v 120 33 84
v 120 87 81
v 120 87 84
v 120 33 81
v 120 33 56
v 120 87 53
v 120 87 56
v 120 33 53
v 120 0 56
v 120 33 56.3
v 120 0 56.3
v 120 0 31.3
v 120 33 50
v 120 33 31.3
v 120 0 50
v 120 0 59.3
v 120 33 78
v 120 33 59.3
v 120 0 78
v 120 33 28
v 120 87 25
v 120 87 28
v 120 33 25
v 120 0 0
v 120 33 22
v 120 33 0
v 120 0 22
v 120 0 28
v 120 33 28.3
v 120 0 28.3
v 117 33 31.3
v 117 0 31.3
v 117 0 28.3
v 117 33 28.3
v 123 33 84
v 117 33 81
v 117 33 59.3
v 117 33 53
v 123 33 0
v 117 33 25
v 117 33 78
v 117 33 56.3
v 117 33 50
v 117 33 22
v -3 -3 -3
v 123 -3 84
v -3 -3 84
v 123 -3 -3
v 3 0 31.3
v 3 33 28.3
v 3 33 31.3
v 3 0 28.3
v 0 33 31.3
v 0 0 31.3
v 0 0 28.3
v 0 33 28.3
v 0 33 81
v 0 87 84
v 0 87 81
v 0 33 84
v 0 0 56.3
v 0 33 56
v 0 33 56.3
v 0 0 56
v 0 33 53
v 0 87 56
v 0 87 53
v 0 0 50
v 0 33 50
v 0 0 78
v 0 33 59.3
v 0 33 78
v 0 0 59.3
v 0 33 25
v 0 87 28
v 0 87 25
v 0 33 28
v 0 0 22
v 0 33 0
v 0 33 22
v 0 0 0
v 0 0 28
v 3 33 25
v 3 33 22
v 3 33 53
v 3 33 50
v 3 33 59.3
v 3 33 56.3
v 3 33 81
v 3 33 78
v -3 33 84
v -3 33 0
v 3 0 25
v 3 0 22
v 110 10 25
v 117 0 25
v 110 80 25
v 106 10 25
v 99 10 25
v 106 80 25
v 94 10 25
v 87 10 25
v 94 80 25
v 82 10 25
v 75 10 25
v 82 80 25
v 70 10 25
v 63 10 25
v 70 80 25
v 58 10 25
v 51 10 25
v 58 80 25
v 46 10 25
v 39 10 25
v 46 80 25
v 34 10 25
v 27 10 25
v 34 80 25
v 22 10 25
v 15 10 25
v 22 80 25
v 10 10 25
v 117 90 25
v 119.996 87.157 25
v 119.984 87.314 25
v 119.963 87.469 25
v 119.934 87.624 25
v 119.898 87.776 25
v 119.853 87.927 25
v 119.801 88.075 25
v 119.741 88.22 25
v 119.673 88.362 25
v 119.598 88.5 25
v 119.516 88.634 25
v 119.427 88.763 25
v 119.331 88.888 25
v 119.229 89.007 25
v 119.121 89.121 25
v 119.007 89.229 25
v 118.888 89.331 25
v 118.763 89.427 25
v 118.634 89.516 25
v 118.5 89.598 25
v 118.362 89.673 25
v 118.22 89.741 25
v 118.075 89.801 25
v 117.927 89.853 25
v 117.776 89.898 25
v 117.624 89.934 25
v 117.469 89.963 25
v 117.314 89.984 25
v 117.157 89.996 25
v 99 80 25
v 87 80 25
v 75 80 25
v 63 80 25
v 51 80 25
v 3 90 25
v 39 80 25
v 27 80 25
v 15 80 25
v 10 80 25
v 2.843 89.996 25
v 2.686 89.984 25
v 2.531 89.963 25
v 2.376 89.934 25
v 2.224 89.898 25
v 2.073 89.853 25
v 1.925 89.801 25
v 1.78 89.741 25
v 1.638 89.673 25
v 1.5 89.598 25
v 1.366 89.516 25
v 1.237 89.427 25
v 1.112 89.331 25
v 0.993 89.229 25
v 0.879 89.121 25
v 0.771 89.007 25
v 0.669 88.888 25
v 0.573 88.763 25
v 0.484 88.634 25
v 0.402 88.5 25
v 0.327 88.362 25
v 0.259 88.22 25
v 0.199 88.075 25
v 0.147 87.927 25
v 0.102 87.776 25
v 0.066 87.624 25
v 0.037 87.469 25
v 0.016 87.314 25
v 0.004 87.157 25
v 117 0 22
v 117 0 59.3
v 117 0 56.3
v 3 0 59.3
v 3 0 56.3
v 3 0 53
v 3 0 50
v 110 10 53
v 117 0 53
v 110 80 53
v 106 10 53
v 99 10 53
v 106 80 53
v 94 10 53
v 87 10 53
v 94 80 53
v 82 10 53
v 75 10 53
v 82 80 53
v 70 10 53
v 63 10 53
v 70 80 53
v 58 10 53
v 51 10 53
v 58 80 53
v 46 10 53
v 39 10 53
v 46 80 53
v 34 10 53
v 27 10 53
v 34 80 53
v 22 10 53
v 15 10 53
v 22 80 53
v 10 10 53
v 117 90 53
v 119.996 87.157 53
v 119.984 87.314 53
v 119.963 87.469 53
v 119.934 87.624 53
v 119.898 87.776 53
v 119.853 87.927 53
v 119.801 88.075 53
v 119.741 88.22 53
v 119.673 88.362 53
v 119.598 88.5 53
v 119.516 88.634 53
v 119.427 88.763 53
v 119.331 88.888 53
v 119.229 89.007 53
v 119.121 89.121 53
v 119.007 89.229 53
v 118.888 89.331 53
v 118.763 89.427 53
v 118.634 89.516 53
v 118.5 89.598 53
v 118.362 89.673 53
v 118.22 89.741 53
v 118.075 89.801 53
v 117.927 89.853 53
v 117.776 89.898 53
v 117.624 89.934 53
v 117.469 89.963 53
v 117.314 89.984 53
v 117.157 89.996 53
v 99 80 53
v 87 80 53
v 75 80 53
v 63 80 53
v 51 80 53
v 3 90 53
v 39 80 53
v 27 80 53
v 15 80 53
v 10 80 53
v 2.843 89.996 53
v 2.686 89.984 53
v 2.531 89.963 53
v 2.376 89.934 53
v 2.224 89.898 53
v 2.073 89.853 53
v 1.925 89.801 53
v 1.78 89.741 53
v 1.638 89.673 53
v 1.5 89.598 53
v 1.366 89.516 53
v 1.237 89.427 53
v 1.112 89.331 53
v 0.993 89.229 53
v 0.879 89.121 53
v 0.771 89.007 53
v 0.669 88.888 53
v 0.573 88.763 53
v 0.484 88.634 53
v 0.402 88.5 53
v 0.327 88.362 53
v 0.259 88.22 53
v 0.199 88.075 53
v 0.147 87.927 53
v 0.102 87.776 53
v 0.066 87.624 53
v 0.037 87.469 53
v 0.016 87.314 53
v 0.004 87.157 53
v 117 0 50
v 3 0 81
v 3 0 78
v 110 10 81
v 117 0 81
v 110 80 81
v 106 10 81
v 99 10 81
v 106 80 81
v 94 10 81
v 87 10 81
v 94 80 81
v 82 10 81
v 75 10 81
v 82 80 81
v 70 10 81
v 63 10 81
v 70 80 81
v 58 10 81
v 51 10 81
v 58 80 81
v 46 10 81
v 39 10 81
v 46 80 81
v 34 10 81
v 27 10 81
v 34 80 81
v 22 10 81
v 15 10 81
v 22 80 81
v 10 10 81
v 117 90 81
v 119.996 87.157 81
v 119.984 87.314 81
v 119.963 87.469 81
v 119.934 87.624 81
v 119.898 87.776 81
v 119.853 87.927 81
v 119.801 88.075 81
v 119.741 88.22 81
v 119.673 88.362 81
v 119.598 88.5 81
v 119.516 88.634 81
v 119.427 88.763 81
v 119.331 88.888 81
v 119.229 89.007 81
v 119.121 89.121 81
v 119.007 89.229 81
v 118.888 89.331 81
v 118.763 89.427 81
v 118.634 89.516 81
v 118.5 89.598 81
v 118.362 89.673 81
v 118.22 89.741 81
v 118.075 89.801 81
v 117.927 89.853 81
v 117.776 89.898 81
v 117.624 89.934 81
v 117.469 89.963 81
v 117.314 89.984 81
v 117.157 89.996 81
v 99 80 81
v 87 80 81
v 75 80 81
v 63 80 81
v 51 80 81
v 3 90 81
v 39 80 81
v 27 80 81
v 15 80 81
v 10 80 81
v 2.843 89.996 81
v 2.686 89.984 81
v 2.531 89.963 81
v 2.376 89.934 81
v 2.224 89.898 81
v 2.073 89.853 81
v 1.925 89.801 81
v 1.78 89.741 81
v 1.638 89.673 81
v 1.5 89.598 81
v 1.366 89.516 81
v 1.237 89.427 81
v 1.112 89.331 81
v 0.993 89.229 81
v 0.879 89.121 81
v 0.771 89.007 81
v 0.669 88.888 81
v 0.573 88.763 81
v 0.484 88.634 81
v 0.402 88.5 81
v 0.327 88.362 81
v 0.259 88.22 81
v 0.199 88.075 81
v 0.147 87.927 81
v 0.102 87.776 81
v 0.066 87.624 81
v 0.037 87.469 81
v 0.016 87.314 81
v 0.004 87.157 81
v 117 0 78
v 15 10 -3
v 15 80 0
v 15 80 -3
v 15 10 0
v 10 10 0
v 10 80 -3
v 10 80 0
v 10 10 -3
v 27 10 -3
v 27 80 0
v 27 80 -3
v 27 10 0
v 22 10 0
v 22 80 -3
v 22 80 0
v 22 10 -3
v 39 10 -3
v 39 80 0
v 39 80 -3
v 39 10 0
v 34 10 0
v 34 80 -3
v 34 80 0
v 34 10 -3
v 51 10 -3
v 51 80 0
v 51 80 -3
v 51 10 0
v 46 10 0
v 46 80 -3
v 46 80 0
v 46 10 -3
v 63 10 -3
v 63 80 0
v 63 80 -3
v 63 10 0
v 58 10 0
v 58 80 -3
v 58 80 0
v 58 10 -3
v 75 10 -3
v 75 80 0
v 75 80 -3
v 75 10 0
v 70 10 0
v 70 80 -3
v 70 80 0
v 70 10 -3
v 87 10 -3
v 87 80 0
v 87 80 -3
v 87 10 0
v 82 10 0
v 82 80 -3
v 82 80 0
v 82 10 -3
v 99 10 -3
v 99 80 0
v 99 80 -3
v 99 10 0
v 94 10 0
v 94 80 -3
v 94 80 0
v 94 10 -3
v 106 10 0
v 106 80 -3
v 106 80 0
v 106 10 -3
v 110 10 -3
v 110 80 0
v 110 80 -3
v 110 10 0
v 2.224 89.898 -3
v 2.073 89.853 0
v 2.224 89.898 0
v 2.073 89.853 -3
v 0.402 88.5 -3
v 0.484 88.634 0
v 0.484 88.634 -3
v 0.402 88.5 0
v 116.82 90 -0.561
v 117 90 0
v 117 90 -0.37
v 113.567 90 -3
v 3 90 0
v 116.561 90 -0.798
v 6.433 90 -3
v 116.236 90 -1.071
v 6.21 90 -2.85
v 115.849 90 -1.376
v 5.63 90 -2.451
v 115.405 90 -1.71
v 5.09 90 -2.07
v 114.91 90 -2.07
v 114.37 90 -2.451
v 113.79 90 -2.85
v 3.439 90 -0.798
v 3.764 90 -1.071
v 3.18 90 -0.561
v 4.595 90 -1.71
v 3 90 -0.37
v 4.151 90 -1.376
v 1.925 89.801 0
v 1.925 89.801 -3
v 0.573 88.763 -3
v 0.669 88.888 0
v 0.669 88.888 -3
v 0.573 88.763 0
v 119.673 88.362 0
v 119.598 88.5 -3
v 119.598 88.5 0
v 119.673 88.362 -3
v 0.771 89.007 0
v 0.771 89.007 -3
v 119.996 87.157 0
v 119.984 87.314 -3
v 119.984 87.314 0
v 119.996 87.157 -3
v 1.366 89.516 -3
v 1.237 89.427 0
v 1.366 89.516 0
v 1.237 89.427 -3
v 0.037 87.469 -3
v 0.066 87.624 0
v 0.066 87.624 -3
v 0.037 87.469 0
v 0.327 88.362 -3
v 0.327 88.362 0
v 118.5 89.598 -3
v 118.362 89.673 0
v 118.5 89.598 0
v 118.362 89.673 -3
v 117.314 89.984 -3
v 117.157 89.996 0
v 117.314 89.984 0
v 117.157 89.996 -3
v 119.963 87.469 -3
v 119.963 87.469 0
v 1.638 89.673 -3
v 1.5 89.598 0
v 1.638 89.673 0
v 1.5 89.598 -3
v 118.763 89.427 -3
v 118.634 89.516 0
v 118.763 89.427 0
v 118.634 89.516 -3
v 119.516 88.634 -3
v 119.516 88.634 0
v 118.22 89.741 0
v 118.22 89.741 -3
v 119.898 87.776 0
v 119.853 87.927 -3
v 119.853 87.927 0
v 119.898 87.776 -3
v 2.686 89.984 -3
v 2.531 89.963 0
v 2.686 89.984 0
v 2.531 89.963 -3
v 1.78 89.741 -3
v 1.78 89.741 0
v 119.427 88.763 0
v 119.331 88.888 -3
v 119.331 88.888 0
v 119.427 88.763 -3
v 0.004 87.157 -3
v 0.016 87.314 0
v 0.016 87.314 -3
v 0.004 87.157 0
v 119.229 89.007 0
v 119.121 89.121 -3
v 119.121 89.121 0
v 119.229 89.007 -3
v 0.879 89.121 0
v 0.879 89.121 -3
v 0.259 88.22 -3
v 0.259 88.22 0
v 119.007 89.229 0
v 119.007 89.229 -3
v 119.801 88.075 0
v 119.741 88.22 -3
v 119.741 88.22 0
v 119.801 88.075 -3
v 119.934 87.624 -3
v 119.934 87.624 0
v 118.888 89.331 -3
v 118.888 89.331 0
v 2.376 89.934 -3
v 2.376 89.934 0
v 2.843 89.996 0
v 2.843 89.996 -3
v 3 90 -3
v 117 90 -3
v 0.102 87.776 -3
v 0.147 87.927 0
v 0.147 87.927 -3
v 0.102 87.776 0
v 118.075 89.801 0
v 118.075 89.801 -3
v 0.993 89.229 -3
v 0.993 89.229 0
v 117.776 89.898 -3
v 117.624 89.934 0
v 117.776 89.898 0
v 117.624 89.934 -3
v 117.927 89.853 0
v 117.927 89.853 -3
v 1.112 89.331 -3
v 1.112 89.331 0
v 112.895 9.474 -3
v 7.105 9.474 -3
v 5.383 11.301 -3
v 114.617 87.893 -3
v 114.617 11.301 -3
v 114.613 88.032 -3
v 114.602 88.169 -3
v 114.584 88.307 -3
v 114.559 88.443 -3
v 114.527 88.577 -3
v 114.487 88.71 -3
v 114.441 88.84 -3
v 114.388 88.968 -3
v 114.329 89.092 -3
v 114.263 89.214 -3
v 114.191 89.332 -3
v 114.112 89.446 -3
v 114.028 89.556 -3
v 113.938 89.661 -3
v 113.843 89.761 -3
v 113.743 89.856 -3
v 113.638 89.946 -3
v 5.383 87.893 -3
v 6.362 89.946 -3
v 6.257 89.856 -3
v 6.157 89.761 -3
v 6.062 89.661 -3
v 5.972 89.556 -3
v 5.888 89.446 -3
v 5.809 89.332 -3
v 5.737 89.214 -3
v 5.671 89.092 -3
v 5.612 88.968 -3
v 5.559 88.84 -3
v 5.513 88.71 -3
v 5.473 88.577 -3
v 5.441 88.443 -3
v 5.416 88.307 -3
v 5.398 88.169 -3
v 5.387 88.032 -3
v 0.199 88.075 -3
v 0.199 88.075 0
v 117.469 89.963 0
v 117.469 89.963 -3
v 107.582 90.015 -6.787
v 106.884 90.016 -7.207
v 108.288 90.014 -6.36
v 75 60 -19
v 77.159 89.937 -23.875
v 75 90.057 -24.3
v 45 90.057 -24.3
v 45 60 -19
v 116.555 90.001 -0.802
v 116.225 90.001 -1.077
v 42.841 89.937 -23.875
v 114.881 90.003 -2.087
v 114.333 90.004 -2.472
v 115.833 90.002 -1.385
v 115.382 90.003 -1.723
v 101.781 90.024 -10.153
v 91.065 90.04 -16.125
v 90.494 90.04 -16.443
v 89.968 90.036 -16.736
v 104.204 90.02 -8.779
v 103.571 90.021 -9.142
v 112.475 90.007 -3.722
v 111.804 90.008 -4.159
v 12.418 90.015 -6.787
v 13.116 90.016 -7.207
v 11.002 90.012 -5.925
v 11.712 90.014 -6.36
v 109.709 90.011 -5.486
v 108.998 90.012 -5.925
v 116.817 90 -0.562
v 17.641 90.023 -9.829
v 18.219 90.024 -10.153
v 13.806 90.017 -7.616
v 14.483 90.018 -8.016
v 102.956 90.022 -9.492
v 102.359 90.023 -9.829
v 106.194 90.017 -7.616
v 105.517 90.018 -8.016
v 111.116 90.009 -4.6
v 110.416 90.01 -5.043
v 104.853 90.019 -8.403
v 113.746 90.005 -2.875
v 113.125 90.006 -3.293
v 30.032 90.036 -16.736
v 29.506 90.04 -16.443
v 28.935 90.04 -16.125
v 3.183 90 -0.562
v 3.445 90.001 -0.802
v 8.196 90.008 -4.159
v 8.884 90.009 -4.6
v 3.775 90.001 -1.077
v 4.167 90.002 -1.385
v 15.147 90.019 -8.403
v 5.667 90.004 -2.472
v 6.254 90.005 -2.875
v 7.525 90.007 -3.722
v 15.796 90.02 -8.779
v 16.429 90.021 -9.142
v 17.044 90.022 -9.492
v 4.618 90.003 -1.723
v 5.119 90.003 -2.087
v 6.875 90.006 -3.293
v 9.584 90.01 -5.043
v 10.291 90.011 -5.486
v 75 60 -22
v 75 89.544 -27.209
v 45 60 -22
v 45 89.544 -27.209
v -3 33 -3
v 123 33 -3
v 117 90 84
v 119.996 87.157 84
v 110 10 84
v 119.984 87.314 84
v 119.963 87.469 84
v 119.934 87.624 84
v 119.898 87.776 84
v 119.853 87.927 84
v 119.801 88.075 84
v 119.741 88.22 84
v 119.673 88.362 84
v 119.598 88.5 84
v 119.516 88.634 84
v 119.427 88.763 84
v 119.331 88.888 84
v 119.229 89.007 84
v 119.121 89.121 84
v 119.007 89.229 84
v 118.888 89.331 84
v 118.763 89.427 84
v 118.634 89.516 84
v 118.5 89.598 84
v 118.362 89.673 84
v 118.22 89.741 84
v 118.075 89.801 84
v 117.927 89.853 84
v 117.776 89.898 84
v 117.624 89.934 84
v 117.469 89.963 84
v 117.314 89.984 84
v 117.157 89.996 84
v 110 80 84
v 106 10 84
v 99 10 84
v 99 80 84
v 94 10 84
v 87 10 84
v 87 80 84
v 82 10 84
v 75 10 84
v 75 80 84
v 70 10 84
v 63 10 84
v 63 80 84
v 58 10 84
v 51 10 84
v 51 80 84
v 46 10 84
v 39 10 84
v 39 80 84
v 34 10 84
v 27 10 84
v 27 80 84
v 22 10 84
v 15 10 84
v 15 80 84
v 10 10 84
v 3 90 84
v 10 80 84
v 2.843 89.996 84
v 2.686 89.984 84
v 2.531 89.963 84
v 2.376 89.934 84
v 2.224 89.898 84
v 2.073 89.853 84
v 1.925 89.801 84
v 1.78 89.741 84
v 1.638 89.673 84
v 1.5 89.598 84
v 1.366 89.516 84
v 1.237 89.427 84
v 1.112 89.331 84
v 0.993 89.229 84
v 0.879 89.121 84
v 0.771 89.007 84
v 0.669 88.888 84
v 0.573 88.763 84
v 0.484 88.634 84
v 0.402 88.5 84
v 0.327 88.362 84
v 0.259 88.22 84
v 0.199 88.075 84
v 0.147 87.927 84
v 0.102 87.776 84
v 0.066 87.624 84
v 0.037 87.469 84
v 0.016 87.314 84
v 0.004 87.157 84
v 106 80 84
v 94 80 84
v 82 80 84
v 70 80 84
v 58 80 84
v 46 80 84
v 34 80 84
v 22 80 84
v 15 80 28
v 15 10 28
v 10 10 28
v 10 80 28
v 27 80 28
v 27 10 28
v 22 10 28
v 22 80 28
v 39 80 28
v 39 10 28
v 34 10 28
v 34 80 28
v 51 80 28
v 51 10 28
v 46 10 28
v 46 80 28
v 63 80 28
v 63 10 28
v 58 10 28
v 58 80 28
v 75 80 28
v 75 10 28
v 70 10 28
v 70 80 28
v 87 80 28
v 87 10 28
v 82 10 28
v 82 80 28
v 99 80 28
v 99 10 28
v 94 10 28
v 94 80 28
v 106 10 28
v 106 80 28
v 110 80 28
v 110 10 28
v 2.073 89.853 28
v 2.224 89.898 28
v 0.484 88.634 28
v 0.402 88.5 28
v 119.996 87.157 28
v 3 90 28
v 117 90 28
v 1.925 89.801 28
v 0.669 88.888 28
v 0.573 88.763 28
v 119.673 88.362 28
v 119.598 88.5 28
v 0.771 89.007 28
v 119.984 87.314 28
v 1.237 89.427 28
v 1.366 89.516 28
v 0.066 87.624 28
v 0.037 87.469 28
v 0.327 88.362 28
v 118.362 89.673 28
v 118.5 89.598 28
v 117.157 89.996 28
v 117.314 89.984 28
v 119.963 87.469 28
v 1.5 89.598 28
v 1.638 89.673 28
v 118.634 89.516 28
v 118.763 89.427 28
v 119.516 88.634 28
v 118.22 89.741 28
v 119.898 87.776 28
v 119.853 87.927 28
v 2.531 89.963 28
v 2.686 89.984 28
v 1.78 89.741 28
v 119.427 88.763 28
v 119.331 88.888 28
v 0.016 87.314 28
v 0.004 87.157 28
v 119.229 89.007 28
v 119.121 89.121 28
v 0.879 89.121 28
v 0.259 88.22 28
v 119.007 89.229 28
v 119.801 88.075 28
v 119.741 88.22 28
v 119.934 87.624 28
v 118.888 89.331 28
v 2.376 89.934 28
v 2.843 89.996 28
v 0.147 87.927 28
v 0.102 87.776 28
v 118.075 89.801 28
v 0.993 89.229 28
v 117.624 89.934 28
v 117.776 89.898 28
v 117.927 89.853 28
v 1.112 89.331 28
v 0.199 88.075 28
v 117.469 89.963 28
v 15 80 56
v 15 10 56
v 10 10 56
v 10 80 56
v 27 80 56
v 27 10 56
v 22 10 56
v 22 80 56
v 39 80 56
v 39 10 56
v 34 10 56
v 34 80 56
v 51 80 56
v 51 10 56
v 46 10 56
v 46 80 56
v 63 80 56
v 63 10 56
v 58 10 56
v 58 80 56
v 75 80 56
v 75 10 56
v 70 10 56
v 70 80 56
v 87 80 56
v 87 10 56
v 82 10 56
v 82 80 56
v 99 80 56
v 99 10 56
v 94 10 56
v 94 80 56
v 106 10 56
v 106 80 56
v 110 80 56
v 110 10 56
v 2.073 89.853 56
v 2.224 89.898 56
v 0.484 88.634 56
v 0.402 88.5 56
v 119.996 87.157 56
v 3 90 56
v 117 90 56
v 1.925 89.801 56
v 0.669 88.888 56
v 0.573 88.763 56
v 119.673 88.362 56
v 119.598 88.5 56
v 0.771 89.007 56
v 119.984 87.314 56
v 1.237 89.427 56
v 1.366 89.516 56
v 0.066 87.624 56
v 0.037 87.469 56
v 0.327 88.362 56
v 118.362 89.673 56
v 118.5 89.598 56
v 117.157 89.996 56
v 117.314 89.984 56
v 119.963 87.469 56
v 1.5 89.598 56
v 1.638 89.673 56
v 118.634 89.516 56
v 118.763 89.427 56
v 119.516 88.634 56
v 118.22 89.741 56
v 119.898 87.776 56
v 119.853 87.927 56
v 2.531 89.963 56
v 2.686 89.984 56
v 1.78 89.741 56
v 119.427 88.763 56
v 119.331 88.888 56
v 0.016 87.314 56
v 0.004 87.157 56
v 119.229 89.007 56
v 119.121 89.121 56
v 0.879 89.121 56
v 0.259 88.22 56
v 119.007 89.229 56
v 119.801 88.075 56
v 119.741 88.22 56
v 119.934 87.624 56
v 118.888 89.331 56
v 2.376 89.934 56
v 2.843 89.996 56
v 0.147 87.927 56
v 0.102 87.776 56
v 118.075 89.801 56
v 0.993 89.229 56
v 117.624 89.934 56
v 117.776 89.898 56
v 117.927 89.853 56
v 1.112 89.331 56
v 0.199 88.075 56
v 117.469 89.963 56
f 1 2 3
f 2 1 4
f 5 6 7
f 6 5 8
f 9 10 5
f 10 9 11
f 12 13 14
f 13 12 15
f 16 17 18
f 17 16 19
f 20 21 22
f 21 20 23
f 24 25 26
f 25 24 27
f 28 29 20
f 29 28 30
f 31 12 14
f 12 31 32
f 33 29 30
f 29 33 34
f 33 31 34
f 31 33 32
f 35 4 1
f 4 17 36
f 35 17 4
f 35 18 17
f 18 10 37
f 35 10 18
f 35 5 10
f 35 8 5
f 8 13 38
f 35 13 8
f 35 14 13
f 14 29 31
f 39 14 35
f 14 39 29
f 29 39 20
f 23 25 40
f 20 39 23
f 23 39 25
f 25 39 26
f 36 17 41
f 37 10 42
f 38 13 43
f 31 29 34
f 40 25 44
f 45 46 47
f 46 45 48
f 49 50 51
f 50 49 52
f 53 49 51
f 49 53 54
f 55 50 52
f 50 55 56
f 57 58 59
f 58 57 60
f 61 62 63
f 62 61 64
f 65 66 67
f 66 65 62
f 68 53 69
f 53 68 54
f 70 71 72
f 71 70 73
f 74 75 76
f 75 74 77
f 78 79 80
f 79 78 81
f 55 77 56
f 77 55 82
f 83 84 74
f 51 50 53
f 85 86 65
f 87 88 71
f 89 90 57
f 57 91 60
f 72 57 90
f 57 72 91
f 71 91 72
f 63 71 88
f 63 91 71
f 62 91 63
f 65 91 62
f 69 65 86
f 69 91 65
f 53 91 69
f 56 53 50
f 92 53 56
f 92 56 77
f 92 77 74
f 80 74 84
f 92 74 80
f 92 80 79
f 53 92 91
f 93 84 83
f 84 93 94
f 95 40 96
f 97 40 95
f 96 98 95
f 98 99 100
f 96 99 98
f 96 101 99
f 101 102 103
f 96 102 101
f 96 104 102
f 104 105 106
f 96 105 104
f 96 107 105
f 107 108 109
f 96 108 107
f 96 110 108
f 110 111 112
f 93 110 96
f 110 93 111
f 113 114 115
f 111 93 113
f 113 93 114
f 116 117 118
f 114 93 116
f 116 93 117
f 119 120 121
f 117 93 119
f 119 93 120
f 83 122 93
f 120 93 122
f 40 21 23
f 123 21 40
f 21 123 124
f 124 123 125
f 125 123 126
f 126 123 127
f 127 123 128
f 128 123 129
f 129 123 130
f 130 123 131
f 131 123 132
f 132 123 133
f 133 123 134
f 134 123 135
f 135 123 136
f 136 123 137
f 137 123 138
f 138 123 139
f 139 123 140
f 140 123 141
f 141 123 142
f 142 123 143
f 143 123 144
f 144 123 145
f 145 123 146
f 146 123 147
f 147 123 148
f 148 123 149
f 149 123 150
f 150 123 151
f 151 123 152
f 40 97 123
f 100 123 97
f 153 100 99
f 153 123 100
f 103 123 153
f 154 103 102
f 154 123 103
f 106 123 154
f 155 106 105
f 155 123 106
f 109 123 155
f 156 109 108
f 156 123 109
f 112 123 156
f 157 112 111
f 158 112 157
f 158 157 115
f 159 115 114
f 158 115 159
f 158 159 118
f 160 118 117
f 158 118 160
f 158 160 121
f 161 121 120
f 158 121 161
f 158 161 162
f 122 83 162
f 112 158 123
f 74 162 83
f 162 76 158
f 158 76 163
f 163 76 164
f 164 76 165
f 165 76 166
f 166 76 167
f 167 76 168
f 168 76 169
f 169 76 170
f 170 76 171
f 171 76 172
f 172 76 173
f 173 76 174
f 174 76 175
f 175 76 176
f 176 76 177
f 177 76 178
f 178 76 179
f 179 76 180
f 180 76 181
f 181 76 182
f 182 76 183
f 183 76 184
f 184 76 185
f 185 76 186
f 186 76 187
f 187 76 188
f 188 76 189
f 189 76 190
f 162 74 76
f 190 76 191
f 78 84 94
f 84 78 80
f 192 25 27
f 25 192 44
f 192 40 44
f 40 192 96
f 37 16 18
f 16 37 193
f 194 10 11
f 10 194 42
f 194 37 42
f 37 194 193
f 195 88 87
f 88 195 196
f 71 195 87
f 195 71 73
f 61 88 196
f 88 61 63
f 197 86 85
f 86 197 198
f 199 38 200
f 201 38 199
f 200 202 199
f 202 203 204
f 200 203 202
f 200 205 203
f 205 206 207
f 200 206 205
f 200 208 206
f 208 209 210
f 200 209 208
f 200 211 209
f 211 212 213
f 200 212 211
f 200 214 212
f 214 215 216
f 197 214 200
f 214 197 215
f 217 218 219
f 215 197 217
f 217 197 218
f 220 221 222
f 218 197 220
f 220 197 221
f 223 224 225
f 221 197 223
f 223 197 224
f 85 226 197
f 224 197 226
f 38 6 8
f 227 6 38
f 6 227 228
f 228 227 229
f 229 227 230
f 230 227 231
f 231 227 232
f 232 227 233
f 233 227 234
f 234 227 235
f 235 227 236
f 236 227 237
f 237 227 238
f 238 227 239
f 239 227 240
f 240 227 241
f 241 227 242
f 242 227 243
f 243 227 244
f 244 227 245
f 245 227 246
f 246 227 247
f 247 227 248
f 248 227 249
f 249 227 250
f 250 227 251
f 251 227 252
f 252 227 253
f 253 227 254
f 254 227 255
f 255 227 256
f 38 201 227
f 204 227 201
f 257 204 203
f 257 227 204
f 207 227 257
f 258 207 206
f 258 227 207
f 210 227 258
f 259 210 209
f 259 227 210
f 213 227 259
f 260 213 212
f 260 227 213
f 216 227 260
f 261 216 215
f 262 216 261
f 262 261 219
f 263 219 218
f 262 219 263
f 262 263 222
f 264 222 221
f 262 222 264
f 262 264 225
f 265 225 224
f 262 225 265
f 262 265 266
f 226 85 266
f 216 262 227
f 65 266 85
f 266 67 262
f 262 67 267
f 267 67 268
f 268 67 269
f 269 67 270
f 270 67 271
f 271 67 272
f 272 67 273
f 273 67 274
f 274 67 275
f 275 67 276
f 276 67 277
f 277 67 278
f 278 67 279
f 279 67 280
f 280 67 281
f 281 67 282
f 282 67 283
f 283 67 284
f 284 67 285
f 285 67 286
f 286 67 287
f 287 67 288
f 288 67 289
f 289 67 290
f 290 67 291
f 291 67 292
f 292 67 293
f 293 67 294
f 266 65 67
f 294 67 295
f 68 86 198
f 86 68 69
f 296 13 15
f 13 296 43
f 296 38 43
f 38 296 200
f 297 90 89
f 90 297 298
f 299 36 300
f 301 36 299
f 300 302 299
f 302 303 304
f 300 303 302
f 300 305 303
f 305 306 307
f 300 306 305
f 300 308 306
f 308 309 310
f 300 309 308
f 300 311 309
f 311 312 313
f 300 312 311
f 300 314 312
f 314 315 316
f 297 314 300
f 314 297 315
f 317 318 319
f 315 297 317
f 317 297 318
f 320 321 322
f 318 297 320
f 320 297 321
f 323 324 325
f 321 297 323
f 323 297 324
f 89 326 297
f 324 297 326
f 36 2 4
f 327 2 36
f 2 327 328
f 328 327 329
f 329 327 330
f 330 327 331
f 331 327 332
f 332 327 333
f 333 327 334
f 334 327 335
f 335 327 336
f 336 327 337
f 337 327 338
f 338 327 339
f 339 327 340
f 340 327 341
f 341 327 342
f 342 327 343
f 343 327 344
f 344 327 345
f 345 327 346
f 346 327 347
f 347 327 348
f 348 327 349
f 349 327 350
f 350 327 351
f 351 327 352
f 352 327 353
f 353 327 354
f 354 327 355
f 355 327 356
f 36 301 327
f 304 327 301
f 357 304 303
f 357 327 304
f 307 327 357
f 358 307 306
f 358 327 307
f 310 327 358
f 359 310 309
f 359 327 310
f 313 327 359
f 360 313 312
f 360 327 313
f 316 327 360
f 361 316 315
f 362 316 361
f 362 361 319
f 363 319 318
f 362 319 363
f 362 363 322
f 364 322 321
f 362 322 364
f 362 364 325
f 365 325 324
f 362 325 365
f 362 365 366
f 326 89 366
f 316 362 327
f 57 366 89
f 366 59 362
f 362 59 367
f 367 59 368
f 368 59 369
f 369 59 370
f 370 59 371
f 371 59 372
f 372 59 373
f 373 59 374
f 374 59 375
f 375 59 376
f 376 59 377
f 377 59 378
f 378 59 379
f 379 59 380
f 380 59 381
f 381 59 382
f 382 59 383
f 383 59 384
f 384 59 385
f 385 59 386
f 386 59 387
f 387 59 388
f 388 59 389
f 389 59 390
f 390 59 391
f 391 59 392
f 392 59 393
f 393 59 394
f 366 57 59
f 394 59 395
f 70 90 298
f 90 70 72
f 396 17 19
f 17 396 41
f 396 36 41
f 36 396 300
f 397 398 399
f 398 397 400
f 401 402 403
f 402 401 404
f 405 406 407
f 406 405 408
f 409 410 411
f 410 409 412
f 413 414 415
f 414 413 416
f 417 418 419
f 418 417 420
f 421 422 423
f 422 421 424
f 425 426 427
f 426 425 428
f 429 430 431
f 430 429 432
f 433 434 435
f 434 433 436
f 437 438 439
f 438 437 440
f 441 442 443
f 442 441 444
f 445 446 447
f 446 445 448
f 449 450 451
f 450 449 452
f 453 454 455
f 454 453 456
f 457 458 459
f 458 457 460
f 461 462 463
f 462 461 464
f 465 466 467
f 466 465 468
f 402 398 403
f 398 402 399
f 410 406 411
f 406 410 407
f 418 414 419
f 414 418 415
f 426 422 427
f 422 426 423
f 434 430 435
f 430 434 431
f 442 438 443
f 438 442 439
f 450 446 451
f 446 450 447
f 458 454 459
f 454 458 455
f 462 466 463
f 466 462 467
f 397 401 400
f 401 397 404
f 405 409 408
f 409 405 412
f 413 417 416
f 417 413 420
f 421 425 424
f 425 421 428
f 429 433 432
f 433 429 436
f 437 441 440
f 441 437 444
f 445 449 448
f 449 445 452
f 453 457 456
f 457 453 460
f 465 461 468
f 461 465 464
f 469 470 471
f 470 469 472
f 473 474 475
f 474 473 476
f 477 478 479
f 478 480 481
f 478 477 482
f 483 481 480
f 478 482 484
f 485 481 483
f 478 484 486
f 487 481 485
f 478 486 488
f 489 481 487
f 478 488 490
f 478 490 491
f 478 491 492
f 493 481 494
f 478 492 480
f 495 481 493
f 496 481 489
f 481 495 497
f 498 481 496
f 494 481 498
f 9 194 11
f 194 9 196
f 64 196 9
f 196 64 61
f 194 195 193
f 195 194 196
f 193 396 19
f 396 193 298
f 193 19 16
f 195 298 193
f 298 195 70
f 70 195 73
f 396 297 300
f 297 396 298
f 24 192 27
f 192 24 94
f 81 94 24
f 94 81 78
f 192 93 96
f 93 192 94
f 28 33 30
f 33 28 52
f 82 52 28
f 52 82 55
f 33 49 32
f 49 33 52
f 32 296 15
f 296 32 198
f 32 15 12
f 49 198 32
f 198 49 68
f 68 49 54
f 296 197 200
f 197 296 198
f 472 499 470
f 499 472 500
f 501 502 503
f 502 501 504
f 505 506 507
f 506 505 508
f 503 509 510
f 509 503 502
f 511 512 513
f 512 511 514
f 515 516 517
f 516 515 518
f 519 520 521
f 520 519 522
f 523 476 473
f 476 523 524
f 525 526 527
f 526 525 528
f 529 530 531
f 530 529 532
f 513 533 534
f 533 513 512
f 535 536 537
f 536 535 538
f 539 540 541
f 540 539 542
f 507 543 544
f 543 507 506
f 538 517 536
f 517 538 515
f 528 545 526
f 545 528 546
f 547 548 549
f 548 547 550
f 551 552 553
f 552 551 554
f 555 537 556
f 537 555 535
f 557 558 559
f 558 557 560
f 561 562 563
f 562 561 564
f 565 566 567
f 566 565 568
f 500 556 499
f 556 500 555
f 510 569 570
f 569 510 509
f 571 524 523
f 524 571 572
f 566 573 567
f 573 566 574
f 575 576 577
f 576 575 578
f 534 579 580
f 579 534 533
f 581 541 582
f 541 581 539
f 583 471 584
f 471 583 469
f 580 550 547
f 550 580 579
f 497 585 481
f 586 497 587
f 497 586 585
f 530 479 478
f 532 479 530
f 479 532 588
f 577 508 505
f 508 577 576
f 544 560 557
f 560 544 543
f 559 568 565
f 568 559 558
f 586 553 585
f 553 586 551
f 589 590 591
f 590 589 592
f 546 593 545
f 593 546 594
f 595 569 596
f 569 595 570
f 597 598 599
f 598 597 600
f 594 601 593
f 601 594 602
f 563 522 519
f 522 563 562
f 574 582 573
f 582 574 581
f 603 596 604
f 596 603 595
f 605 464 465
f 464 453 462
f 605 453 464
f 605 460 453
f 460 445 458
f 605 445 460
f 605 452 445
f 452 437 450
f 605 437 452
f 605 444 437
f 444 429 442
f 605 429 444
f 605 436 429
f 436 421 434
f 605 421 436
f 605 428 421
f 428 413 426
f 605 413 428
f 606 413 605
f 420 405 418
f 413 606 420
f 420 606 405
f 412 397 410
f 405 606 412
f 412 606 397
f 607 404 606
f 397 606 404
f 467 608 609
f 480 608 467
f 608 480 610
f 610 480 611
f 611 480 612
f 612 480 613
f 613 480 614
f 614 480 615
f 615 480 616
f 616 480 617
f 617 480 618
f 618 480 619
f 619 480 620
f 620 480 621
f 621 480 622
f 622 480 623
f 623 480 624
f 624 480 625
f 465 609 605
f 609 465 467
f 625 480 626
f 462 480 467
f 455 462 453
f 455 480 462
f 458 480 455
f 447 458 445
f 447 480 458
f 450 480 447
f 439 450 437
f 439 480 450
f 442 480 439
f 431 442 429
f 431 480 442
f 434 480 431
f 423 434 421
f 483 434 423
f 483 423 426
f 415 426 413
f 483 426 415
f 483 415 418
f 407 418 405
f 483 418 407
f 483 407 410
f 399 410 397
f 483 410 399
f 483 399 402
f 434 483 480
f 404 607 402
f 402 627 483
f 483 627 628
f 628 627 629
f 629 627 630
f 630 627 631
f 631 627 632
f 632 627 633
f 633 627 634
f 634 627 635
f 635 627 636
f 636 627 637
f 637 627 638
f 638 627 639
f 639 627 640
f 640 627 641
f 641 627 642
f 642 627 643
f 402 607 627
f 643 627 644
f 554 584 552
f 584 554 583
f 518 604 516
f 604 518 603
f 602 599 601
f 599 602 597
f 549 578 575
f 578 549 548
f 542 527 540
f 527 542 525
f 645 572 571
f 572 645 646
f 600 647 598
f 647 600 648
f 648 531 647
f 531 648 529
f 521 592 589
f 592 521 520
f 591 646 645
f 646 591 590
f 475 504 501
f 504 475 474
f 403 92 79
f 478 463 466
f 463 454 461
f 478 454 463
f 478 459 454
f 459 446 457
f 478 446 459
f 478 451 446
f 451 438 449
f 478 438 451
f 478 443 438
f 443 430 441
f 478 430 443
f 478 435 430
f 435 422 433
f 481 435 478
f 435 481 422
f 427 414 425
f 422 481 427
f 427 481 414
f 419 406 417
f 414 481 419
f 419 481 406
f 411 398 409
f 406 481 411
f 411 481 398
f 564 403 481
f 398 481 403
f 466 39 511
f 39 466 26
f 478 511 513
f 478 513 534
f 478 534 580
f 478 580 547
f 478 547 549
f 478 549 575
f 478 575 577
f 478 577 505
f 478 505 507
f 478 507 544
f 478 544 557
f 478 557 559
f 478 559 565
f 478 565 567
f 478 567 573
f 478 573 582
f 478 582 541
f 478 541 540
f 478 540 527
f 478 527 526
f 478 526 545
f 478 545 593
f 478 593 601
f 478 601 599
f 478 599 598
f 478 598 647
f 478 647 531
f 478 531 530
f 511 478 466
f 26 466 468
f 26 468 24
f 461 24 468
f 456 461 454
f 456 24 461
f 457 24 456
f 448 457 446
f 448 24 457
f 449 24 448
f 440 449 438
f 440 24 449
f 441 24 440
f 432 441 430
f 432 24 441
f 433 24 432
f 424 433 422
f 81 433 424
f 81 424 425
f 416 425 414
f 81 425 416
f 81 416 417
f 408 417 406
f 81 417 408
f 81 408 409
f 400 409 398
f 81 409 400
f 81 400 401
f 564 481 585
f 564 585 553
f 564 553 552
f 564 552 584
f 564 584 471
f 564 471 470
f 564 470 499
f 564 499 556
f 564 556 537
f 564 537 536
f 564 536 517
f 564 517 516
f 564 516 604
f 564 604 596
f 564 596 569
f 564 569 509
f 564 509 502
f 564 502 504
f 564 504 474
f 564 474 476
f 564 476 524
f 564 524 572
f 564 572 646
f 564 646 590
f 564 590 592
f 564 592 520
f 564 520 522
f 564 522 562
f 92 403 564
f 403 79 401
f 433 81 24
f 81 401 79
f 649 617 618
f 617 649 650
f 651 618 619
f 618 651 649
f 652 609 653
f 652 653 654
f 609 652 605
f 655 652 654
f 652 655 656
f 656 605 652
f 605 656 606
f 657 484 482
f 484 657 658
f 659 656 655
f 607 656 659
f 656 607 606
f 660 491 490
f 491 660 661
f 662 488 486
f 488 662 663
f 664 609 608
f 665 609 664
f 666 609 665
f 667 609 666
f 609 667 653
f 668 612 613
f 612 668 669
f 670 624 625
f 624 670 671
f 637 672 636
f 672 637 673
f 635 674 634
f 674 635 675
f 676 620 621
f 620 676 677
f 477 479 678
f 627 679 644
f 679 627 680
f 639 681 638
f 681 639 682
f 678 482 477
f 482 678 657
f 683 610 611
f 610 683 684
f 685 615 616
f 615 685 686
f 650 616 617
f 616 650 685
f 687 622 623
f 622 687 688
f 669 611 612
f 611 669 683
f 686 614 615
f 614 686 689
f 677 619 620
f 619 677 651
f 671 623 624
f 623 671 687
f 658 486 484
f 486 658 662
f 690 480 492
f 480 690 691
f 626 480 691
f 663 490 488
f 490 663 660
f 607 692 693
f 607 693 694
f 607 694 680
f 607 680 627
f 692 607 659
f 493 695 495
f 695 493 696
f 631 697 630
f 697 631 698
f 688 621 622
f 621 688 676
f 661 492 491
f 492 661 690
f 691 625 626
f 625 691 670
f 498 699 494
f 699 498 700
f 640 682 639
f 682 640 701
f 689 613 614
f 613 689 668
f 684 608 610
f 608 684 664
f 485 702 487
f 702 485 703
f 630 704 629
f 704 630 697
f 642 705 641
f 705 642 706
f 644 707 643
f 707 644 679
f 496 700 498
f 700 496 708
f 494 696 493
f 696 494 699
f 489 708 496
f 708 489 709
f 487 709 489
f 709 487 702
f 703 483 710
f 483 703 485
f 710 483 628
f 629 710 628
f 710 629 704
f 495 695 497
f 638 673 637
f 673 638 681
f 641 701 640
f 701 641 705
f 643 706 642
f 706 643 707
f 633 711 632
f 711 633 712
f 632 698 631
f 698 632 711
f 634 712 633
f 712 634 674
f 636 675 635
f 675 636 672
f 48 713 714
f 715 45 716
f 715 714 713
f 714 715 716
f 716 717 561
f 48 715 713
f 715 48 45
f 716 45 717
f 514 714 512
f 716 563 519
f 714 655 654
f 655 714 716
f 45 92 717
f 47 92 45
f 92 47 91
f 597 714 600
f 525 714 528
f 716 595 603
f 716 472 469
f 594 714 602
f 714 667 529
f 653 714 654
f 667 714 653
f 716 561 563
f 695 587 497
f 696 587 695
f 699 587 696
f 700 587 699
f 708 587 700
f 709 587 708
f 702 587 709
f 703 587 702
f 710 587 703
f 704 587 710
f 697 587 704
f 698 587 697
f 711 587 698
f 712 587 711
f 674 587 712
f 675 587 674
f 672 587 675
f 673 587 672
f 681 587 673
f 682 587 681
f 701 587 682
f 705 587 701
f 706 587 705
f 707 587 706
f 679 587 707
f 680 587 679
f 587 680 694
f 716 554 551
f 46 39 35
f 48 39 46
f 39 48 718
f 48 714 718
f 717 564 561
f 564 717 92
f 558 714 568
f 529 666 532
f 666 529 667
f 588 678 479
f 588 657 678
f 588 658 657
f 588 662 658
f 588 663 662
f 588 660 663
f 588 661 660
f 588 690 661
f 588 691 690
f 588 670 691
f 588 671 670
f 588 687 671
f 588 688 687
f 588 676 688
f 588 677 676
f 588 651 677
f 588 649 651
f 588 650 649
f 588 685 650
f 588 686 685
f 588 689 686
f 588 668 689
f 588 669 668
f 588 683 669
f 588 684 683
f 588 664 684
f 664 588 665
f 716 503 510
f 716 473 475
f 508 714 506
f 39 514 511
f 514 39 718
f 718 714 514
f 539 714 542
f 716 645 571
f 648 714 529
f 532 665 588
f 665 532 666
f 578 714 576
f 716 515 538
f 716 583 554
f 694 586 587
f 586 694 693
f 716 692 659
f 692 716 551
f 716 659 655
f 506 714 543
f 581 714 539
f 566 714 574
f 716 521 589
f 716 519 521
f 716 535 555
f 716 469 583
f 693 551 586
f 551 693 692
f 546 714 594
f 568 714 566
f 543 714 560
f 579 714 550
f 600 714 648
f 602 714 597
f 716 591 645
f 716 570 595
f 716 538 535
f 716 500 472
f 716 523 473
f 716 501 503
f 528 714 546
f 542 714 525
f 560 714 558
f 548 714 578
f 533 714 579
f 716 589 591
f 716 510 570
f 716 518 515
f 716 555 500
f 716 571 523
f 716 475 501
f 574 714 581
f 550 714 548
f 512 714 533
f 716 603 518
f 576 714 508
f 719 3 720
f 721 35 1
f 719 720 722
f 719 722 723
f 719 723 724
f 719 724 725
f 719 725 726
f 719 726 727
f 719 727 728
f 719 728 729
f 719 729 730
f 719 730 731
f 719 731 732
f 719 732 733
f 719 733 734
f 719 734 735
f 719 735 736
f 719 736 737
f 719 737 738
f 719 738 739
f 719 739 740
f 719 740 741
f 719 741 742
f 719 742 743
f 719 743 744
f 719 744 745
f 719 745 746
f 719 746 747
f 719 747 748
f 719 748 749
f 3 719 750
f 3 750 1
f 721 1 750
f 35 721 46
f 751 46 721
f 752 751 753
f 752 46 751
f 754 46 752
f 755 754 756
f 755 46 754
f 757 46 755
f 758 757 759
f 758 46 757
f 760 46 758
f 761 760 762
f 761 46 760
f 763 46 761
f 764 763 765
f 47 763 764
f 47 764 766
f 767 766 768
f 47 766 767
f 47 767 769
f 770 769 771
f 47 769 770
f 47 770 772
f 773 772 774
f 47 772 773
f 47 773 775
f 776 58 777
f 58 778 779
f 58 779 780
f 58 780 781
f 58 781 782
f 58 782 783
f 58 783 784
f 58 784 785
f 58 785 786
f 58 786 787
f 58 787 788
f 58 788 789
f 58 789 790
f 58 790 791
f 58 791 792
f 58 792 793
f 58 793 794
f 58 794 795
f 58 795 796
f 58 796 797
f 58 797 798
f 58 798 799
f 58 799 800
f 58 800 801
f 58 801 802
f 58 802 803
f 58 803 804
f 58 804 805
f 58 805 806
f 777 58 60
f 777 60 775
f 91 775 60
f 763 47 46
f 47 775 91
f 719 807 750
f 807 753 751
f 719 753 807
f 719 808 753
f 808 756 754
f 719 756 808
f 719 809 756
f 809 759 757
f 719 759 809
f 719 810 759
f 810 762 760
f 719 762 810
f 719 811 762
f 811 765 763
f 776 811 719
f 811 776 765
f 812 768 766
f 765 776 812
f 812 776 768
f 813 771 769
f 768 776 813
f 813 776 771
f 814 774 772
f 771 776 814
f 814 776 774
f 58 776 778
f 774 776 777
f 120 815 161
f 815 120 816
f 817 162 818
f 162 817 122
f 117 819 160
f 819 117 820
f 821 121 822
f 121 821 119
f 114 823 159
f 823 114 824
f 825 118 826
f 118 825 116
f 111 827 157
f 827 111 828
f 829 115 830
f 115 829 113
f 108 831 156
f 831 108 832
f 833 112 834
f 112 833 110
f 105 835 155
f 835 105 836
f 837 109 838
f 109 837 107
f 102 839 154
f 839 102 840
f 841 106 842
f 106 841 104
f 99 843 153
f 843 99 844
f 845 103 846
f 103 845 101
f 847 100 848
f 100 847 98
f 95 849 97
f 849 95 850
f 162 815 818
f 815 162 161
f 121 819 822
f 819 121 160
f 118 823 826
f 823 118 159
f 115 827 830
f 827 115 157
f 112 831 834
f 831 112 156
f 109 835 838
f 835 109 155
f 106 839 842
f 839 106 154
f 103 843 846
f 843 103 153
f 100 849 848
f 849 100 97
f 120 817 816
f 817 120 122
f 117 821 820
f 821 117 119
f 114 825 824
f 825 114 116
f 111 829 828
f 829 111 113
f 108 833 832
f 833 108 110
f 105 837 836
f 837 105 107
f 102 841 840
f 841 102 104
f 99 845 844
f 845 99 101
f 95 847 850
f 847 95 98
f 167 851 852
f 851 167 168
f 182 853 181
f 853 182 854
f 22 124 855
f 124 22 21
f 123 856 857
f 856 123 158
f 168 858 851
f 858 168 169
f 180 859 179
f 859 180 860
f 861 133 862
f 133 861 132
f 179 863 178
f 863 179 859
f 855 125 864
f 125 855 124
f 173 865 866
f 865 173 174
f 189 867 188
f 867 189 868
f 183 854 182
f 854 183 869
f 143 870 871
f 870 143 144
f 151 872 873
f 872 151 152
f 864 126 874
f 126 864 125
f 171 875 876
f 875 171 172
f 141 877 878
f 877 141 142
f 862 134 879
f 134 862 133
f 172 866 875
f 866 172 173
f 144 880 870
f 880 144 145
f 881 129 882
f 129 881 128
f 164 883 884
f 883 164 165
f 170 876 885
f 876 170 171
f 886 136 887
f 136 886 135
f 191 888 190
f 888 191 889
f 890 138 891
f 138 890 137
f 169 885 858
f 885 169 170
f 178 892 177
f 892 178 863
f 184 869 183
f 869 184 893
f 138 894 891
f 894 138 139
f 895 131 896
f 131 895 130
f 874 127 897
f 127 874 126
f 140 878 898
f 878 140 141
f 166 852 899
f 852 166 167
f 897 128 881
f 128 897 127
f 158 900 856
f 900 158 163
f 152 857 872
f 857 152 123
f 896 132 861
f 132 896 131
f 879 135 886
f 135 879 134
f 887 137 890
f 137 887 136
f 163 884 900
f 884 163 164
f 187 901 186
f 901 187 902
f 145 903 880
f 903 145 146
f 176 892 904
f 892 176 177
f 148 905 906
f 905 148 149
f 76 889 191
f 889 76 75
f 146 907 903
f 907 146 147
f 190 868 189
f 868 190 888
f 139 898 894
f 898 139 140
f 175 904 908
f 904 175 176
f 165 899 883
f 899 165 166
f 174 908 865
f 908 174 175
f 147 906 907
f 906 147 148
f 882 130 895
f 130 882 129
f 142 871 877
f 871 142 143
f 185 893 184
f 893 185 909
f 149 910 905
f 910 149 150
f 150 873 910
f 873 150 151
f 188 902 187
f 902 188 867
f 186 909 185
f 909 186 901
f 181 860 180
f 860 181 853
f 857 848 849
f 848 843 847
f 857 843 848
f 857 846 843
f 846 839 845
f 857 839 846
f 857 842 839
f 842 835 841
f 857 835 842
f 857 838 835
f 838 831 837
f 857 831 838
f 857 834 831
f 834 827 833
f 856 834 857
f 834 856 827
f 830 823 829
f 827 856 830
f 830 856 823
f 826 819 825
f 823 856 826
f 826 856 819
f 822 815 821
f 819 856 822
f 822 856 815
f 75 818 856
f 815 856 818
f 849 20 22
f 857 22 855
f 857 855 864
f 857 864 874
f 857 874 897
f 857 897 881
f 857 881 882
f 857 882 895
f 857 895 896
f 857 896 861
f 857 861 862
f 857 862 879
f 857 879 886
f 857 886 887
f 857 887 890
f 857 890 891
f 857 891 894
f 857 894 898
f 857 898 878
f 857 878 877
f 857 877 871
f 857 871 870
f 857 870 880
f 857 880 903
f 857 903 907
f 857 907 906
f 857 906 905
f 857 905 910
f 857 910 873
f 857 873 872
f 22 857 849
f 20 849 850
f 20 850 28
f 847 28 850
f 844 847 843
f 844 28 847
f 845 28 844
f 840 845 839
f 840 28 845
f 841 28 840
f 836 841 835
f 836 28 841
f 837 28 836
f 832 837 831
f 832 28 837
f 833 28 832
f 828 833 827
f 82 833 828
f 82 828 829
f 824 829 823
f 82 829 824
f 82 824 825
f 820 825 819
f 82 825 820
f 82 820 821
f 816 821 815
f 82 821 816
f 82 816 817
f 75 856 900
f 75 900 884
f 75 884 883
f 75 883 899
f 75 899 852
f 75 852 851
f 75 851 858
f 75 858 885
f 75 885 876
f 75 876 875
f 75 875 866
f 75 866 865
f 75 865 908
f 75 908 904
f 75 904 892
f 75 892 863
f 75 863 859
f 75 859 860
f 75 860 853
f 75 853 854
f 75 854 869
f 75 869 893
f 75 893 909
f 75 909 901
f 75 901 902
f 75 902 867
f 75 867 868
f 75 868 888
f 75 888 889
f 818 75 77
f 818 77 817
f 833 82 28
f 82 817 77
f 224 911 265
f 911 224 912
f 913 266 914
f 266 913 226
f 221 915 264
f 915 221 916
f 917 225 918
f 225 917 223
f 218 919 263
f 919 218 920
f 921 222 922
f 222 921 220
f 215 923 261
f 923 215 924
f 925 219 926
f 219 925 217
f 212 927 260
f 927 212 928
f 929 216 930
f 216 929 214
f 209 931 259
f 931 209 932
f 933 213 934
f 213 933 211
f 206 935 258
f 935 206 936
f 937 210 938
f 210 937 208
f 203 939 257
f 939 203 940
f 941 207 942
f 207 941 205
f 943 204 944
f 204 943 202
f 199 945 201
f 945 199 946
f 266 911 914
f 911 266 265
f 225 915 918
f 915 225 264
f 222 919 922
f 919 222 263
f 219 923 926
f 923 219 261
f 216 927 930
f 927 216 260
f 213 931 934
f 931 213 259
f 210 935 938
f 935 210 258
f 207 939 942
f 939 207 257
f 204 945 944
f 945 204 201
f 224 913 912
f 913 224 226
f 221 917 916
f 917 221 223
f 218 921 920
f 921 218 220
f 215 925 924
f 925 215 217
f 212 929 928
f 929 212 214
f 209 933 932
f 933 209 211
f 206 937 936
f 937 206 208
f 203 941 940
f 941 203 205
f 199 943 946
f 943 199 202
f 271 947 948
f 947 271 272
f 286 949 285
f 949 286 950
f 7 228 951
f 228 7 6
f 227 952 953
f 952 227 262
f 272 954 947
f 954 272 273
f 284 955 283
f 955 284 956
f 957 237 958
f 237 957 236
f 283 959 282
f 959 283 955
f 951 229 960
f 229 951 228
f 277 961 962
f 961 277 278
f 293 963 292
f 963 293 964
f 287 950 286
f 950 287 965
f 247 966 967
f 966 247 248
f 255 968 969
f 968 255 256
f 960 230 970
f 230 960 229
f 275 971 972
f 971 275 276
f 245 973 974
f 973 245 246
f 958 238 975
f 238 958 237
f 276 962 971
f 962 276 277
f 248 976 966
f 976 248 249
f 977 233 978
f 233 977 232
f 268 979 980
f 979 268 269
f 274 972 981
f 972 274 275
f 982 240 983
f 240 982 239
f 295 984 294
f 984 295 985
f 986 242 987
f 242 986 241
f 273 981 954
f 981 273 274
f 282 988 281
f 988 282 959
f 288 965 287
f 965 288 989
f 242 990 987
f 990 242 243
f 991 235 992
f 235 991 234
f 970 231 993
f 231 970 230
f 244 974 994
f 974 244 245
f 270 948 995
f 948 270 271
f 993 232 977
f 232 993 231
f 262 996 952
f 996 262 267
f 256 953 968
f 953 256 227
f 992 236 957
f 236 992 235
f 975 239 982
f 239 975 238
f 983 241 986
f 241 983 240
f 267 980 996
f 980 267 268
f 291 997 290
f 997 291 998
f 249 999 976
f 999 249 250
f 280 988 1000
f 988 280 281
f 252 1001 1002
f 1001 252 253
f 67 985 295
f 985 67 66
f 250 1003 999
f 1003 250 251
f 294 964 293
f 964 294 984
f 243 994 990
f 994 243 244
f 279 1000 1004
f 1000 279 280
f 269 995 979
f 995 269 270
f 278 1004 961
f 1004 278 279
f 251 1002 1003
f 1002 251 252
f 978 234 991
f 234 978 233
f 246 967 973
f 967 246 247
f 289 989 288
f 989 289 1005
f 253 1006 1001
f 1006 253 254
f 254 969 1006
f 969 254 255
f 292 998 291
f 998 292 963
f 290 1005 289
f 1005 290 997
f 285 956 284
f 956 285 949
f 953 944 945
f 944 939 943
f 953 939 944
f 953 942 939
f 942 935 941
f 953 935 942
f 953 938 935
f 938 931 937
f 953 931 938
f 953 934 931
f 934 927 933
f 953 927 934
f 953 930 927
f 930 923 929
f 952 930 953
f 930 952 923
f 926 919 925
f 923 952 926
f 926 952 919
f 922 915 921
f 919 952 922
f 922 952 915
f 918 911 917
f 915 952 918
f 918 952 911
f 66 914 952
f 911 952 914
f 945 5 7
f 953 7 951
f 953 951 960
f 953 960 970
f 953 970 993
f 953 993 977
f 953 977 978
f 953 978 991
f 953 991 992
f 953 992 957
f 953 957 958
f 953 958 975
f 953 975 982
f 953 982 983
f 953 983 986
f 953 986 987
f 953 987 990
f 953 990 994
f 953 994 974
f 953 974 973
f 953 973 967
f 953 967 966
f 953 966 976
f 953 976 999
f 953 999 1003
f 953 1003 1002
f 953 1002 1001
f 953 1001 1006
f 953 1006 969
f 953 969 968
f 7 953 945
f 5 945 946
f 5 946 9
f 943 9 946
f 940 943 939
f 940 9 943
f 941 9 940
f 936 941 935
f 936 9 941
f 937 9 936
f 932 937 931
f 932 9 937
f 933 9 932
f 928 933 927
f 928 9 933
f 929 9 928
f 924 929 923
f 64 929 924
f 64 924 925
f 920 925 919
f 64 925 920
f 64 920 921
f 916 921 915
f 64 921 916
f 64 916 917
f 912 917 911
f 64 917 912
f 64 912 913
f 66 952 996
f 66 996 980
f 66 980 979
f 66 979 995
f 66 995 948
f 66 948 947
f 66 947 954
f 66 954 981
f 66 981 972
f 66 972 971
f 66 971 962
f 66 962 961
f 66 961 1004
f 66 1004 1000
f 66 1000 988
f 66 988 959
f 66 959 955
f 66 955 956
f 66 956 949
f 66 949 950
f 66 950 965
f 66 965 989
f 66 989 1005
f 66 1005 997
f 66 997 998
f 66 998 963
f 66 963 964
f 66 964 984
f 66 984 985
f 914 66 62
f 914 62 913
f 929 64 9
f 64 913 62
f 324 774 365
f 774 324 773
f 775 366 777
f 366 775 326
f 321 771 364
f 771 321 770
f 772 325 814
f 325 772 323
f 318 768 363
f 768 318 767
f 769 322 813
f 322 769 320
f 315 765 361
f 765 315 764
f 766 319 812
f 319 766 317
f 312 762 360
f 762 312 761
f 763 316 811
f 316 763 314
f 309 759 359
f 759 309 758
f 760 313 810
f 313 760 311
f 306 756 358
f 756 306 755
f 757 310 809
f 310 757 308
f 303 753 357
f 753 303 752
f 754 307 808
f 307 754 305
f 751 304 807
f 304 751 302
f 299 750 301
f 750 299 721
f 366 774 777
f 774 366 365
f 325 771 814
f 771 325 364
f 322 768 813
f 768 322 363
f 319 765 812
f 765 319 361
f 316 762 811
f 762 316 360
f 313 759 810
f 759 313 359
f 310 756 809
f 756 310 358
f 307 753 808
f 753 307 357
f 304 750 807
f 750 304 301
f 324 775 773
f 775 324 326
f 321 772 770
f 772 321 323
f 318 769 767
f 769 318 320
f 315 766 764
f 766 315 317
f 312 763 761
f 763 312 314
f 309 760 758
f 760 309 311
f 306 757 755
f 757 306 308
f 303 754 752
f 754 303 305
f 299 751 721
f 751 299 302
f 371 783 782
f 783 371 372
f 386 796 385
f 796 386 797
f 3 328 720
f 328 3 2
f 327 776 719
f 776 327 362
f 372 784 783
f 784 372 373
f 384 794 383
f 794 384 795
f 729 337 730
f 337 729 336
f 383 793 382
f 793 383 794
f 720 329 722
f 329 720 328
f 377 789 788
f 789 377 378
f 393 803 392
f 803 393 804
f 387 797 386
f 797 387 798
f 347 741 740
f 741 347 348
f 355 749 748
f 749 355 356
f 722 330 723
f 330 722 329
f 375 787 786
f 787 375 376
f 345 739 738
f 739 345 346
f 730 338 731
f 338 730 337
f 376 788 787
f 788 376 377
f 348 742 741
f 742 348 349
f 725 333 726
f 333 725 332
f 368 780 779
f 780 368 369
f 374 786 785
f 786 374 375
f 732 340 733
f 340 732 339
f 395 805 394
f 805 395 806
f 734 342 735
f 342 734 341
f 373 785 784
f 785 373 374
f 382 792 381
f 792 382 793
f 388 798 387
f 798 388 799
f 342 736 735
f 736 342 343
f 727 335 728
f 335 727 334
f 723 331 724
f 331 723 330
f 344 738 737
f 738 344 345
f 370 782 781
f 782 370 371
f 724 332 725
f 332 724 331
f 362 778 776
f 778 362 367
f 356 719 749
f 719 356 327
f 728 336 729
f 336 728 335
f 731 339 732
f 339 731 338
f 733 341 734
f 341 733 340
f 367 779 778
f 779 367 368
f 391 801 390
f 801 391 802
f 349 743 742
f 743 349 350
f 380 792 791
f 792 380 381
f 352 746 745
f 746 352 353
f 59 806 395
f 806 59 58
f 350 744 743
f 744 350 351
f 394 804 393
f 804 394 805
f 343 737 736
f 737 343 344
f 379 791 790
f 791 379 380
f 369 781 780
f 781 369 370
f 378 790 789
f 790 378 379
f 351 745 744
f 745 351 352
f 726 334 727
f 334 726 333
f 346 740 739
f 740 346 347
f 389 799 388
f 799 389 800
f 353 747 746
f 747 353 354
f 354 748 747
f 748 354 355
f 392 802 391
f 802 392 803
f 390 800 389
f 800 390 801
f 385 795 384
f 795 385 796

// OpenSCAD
$fn=120;

module sponge() {
    color("blue") cube([112,80,22]);
}

module shelf_support(full=true) {
    translate([0,-3,-6]) cube([3,90*.4,3]);
    translate([120-3,-3,-6]) cube([3,90*.4,3]);
    if(full) {
        translate([120-3,-3,0.3]) cube([3,90*.4,3]);
        translate([0,-3,0.3]) cube([3,90*.4,3]);
    }
}

module shelf(r=3) {
    translate([0,0,-3]) difference() {        
        hull() {
            translate([0,0,0]) cube([1,1,3]);
            translate([120-1,0,0]) cube([1,1,3]);
            translate([r,90-r,0]) cylinder(h=3,r=r);
            translate([120-r,90-r,0]) cylinder(h=3,r=r);
        }
        intersection() {
            for(i=[0:10:150]) {
                rotate([0,0,10*0]) translate([i*1.2+10,-50,-1]) cube([5,150,5]);   
            }
            translate([10,10,-1]) cube([100,70,5]);
        }
    }
}

module base() {
    translate([0,0,28]) shelf_support();
    translate([0,0,56]) shelf_support();
    translate([0,0,84]) shelf_support(false);
    translate([0,-3,-3]) cube([120,3,84+3]);
    translate([-3,-3,-3]) cube([3,90*.4,84+3]);
    translate([120,-3,-3]) cube([3,90*.4,84+3]);
    difference() {
        hull() {
            union() {
                shelf();
                translate([0,-3,-3]) cube([120,3,3]);
                translate([-3,-3,-3]) cube([3,90*.4,3]);
                translate([120,-3,-3]) cube([3,90*.4,3]);
            }
                
            translate([120/2-30/2, 90-30, -22]) rotate([-10,0,0]) cube([30,30,3]);
        }
        union() {
            hull() {
                translate([0,0,3]) shelf();
                translate([120/2-30/2, 90-30, -22+3]) rotate([-10,0,0]) cube([30,35,3]);
            }
            shelf();
        }
    }
}



base();
color("grey") shelf();
color("grey") translate([0,0,28]) shelf();
color("grey") translate([0,0,56]) shelf();
color("grey") translate([0,0,84]) shelf();
//translate([4,0,0]) sponge();
//translate([4,0,28]) sponge();
//translate([4,0,56]) sponge();
//translate([4,0,84]) sponge();
